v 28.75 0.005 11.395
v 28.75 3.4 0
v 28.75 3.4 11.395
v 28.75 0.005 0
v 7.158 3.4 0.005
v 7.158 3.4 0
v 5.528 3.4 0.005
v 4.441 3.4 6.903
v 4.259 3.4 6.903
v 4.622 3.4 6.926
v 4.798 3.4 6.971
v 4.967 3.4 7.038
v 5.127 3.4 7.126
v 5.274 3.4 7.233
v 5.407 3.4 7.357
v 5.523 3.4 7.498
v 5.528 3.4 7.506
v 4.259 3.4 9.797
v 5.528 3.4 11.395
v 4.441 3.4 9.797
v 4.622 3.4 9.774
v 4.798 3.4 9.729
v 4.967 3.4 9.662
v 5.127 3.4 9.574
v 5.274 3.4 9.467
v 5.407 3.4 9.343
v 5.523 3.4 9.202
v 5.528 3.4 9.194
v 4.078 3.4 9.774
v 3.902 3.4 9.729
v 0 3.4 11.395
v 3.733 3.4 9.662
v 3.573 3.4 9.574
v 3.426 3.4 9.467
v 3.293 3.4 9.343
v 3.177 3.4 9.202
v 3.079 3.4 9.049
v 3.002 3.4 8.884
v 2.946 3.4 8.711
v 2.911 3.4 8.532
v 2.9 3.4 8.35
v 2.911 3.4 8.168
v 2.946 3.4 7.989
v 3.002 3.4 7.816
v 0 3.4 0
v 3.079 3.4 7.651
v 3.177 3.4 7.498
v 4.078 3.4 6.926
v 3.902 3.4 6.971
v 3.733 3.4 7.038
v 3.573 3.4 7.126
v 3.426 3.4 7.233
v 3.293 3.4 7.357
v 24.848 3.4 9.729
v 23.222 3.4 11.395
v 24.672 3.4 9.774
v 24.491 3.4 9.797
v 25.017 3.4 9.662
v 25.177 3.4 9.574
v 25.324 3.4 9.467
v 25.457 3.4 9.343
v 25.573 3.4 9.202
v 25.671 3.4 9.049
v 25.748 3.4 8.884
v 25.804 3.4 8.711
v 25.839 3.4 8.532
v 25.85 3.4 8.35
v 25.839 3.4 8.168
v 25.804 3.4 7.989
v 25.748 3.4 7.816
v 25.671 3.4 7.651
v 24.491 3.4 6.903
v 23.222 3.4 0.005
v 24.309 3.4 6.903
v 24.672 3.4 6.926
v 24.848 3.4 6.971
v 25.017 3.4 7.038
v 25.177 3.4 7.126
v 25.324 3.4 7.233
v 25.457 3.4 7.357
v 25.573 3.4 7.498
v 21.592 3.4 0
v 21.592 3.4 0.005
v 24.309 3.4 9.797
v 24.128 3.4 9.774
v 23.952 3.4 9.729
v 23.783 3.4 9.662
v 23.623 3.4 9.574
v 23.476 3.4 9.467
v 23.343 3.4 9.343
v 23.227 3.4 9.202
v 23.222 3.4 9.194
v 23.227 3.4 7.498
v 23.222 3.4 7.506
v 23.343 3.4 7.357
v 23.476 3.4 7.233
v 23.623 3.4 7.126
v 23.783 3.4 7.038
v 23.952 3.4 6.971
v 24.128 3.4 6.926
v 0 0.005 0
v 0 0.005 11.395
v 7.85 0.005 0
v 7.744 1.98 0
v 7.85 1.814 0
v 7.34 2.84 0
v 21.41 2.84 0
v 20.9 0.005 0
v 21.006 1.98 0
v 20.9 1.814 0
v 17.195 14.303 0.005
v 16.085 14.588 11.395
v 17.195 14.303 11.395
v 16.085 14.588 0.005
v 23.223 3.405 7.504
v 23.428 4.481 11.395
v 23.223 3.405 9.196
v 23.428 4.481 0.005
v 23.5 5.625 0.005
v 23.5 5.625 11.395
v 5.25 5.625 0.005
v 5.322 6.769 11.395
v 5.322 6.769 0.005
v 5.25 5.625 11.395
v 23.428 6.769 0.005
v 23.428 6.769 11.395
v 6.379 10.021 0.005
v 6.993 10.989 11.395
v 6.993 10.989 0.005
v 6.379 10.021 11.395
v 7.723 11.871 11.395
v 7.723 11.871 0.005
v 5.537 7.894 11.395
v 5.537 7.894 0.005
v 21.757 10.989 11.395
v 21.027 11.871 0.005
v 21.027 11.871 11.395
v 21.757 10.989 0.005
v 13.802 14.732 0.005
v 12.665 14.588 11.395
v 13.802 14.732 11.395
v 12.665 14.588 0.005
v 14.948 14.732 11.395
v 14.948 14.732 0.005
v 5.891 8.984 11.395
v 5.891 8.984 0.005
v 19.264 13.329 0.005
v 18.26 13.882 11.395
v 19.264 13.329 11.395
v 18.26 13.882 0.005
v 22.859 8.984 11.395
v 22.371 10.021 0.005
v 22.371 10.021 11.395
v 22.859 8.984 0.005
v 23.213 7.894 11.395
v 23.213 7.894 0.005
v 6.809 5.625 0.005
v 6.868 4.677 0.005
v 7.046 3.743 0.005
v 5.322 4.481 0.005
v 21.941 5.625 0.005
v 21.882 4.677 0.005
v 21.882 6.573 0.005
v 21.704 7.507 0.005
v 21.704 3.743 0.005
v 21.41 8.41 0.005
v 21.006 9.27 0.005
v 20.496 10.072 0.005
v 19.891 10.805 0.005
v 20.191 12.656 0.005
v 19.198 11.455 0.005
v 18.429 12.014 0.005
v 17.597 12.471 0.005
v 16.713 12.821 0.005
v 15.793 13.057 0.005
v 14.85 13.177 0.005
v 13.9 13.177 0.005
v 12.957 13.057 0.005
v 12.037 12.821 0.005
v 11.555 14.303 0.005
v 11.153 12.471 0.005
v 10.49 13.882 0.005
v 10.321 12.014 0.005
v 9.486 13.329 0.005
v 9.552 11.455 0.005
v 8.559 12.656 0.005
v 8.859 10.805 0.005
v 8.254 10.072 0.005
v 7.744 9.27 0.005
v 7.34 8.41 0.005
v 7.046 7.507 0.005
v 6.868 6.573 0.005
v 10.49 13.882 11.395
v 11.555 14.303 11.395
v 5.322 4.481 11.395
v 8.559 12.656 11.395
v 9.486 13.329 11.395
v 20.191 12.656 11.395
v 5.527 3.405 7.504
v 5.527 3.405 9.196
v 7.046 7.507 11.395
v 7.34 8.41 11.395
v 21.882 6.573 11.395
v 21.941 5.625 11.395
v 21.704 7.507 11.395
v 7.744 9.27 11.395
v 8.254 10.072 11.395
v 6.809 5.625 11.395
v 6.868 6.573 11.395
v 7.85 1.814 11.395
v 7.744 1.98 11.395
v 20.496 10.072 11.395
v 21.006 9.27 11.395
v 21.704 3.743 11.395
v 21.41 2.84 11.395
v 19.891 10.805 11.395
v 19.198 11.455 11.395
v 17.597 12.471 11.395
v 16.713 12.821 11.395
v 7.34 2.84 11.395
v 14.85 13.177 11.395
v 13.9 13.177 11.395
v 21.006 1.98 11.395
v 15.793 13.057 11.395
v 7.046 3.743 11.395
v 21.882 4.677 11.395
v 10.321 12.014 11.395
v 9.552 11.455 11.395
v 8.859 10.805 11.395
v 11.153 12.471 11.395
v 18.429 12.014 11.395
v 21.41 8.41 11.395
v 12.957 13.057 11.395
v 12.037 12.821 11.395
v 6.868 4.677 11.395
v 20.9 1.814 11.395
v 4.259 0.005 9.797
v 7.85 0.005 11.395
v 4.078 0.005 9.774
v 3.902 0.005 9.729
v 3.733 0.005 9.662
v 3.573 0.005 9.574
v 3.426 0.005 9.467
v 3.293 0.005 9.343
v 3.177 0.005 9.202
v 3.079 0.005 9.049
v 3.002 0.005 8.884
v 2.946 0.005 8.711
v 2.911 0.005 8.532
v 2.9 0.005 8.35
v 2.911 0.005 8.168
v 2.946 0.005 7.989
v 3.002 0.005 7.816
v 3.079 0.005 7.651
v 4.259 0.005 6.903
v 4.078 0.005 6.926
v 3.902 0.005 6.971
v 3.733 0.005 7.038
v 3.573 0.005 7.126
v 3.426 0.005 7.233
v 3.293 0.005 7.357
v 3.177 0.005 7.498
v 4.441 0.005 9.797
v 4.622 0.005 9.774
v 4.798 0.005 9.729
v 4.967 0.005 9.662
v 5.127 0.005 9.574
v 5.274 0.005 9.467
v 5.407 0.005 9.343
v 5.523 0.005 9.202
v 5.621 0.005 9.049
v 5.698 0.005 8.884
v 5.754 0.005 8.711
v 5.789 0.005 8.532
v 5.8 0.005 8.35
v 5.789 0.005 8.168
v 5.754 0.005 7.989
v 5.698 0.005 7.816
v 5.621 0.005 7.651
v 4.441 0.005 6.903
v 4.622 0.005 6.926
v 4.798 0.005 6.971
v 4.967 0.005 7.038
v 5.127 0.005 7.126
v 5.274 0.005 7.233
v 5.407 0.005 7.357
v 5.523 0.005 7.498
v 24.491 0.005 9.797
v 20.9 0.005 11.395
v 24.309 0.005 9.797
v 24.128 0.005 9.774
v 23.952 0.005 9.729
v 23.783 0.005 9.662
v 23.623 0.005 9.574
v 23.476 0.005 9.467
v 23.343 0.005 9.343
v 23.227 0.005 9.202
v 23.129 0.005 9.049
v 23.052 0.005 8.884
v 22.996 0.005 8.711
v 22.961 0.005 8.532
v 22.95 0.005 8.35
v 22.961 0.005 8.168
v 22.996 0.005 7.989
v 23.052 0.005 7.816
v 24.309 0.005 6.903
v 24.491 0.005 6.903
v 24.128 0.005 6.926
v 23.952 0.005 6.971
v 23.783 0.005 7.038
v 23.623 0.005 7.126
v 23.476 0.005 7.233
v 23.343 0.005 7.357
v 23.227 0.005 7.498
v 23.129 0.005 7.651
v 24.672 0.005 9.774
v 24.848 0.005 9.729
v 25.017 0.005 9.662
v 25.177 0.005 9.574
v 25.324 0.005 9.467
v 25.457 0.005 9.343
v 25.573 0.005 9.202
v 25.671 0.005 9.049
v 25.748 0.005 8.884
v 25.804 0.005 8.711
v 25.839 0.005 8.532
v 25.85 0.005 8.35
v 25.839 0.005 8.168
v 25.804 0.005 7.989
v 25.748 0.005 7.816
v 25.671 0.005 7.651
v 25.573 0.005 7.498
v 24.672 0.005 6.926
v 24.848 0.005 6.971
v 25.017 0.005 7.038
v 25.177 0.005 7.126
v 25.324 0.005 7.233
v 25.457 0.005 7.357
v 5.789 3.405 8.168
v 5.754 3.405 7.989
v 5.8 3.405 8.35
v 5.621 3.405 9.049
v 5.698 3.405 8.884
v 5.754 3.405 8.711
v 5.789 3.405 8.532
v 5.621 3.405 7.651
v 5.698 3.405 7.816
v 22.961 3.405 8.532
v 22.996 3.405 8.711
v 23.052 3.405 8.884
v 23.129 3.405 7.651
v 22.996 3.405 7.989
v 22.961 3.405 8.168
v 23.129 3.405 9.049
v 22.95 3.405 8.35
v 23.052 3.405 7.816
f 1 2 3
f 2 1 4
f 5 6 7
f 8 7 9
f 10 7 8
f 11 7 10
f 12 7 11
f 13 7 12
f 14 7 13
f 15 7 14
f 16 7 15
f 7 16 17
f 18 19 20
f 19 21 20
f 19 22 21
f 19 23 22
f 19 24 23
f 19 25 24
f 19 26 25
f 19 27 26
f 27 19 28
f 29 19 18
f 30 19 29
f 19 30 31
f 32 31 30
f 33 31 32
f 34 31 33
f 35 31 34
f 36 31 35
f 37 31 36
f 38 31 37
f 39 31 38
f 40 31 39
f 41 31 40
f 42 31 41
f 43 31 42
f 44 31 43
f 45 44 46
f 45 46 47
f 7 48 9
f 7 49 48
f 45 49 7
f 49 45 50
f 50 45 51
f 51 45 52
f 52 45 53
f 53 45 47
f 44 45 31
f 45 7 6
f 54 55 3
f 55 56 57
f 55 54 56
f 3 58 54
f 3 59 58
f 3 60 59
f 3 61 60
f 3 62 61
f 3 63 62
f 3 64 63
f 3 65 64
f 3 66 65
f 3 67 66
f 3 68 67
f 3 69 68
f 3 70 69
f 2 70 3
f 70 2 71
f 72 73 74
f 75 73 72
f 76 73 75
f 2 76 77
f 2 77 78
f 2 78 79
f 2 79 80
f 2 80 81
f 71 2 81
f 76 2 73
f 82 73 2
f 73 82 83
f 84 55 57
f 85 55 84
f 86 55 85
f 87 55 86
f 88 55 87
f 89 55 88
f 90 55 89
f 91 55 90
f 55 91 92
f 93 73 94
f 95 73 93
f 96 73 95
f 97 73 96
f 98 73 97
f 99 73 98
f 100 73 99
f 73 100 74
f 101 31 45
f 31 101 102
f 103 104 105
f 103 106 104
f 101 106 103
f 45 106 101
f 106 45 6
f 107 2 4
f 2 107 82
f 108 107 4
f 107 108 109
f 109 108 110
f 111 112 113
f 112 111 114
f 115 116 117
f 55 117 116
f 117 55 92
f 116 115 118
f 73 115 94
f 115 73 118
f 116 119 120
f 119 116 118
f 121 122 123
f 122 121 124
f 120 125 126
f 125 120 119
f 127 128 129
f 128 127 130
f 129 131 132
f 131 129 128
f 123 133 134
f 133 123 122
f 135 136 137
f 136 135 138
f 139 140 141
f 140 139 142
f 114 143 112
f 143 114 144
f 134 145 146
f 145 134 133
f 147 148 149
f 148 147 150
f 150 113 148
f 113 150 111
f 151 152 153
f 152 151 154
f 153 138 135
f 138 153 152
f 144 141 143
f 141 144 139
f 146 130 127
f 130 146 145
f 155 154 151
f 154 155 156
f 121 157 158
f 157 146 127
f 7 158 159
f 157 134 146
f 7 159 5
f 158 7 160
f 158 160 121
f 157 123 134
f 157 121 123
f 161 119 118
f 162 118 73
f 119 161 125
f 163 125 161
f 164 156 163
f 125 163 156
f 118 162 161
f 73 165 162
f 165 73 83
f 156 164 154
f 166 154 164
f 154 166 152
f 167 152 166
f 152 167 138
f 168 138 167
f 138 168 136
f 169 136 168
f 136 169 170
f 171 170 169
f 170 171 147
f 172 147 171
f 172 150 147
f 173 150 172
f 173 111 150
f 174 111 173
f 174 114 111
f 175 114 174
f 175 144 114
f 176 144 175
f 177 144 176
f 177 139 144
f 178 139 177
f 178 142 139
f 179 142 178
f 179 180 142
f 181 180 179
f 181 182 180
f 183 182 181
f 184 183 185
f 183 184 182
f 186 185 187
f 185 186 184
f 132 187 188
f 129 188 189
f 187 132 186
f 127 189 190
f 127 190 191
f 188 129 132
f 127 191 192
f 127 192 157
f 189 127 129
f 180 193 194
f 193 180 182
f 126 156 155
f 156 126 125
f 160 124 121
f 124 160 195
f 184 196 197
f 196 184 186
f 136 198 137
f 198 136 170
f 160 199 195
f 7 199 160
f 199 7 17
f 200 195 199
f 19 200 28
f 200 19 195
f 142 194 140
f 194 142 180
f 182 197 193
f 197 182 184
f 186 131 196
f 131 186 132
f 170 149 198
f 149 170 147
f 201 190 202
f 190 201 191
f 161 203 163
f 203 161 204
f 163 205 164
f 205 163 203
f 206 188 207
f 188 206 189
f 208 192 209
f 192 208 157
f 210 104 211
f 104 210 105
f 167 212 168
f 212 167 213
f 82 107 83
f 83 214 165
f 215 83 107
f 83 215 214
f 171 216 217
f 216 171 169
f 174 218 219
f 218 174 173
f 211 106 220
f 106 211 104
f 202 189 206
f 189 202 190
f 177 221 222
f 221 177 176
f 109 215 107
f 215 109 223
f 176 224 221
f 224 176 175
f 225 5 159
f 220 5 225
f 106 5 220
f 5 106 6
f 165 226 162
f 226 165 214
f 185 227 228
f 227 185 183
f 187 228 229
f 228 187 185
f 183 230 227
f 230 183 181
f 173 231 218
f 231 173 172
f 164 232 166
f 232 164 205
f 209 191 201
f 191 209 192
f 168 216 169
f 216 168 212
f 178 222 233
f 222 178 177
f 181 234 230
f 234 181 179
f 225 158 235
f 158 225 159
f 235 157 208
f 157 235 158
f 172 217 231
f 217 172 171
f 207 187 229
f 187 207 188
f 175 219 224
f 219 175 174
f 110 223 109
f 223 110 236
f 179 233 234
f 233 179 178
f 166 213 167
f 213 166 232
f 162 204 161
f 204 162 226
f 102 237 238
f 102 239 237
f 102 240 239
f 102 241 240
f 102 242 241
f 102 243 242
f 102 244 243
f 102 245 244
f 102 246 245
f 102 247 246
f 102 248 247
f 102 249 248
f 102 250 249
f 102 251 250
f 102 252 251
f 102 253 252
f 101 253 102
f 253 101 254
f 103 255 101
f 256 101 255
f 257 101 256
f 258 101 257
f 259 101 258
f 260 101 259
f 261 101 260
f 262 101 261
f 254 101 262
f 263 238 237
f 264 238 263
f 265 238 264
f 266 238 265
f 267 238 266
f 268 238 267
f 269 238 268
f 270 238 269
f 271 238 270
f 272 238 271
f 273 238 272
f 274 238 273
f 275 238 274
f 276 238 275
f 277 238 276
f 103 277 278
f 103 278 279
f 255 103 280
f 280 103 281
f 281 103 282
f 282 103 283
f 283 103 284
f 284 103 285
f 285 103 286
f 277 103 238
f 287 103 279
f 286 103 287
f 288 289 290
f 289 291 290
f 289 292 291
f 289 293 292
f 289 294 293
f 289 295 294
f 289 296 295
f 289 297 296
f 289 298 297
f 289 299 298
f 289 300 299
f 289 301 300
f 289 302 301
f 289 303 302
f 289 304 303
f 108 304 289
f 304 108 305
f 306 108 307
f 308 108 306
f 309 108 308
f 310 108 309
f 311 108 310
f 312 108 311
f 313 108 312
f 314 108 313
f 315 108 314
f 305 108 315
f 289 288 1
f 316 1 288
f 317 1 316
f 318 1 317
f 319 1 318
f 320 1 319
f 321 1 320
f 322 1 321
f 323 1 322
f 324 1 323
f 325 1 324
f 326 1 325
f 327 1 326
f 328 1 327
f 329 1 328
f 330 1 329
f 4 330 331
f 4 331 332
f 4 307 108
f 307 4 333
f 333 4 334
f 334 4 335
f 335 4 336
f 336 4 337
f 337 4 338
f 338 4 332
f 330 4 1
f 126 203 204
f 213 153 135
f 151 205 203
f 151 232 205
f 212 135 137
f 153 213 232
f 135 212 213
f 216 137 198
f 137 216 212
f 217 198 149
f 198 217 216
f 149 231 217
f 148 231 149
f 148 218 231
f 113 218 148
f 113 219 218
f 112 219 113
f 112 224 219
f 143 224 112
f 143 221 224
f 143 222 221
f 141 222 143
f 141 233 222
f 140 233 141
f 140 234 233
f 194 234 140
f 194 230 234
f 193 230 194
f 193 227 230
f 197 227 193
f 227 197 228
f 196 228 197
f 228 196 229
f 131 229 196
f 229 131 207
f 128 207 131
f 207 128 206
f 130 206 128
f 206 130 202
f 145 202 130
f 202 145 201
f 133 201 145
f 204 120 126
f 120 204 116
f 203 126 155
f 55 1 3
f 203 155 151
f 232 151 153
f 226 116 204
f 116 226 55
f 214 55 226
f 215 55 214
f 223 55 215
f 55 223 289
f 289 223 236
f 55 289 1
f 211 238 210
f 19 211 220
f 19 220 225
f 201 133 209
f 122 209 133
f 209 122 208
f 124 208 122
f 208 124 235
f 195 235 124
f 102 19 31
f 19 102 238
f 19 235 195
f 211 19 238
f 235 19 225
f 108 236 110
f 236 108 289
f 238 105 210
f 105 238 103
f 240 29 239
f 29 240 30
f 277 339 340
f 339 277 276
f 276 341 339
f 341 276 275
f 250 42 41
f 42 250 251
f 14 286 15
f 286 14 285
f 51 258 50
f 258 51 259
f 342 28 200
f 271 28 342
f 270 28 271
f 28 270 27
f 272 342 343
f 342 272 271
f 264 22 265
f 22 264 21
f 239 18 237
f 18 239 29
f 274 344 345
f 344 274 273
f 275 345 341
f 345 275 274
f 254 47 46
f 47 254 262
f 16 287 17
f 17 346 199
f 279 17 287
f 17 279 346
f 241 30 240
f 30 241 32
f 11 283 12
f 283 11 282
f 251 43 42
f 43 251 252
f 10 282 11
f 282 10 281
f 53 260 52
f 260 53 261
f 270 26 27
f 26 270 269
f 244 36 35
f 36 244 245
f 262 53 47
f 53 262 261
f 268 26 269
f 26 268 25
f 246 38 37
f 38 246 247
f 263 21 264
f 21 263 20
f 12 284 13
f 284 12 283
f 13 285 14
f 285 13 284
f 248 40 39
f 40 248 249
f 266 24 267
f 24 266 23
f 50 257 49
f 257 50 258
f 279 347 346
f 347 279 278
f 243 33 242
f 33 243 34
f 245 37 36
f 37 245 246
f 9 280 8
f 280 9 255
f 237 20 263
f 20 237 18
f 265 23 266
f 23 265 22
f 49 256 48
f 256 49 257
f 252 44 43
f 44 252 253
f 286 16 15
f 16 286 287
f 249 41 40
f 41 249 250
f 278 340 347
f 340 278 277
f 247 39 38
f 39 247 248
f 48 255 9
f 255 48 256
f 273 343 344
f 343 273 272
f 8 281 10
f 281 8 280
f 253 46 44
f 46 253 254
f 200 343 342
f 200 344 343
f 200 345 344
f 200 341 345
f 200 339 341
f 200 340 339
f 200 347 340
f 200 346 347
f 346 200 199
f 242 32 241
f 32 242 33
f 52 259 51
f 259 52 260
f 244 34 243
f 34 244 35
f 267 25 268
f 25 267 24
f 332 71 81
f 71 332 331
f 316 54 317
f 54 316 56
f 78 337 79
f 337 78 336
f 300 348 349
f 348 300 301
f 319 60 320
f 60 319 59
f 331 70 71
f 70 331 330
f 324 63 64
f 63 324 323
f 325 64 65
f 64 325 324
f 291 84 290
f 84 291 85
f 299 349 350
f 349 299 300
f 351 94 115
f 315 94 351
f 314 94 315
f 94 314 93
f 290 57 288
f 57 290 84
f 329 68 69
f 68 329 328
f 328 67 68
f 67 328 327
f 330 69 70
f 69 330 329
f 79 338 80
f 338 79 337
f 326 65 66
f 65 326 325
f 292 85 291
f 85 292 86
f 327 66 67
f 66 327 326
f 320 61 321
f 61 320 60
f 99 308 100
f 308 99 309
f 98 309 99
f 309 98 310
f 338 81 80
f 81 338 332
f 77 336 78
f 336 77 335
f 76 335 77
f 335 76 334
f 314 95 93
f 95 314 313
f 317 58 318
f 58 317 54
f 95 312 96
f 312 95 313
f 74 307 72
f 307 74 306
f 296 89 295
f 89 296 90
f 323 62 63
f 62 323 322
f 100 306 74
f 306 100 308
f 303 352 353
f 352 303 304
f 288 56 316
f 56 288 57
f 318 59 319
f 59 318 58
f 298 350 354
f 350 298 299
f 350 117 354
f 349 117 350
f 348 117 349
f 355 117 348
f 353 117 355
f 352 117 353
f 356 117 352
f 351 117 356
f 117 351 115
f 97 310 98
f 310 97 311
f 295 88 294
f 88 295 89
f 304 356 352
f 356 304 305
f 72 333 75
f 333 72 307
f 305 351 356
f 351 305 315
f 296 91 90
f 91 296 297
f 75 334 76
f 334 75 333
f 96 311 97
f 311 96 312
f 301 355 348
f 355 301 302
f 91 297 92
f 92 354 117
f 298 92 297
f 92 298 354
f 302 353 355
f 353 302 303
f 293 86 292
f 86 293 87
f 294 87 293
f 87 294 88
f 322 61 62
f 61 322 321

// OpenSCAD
// model: Prusa i3 MK2 Y Chassis Bearing Straps
//        This replaces the zip ties that tend to stretch and can reduce accuracy over time.
// author: fiveangle@gmail.com
// date: 2016oct11
// ver: 1.0.0
//      1.0.1,Bushmills: improved rendering by eliminating faces resulting from OpenSCAD undecidedness whether
//                       to add or remove them, as many boundaries in difference() evaluated to identical planes. 
//                       I added variable "little" and used it to position and size primitives accordingly.
//                       Also removed a positioning bug, but refrained from attempting a much needed simplification.
// notes: Print 2x "left" and 1x "right". Use 6x M3x10mm button-head or socket-head screws to secure.
// history:
//     -1.0.0 - 2016oct11 - Released
//


$fn = 50;

bearingDiameter = 15.05; // [15.00:Tight - 15.00mm, 15.05:default - 15.05mm, 15.1:Loose - 15.10mm, 15.2:Lucy Goosey - 15.20mm]
bearingLength = 15.1; // [15.0:Tight - 15.00mm, 15.1:default (to ridge) - 15.05mm, 15.2:Loose - 15.20mm, 24.2:Full bearing length - 24.20mm]
bearingType = "left"; // [left:Left, right:right]
nozzleWidth = 0.4; // used to calculate strap thickness
shellsForStrap = 4; // adjust with nozzleWidth to get desired strap thickness
bearingRidgeDiameter = 14.6;
bearingRidgeWidth = 0.8;
mountLength = bearingLength + 2 * bearingRidgeWidth;
screwDiameter = 2.9; // [2.8:Tight - 2.8mm, 2.9:default - 2.9mm, 3.0:Loose 3.0mm]
mountHoleSeparation = 22.9 - (22.9 - 17.2) / 2;
strapThickness = shellsForStrap * nozzleWidth;
mountWidth = mountHoleSeparation + 3 * screwDiameter;
prusaYChassisThickness = 6.2; // Measurement of your Y Chassis thickness
prusaYChassisBearingSlotWidth = bearingDiameter - 2;
prusaYChassisbearingSinkage = 4.3; // Measure Y chassis to bearing distance using depth guage in bearing slot minus about 0.2 mm for pretension
mountTabThickness = (prusaYChassisThickness - prusaYChassisbearingSinkage) + 5;
mountDiameter = bearingDiameter + (2 * strapThickness);
mountHeight = mountDiameter;

little = 0.01;

// polyhole cylinder fitment method: http://hydraraptor.blogspot.com/2011/02/polyholes.html
module polyhole(d, h) {
    n = max(round(2 * d), 3);
    rotate([0, 0, 180])
        cylinder(h = h, r = (d / 2) / cos(180 / n));
}


module bearing() {
        difference() {
            // mount body
            union() {
                cube([mountWidth, mountLength, mountTabThickness]);

                translate([mountWidth / 2, +little/2, (bearingDiameter / 2) + strapThickness])
                    rotate([-90, 0, 0])
                        cylinder(r = (bearingDiameter / 2) + strapThickness, h = mountLength-little);

            }

            // bearing core
            union() {
                    translate([mountWidth / 2, 0, (bearingDiameter / 2) + strapThickness])
                        rotate([-90, 0, 0])
                            cylinder(r = ((bearingRidgeDiameter / 2)), h = mountLength);

                    translate([mountWidth / 2, (mountLength - bearingLength)+little/2, (bearingDiameter / 2) + strapThickness])
                        rotate([-90, 0, 0])
                            polyhole(bearingDiameter, bearingLength+little);

                }
                
            // prusa bearing sink
                translate([-little/2, -little/2, -little/2])
            cube([mountWidth + 10+little, mountLength+little, prusaYChassisThickness - prusaYChassisbearingSinkage + strapThickness+little]);

            if (bearingType == "left")
                translate([-little/2, -little/2, -little/2])
                cube([mountWidth+little, mountLength - (mountLength / 2 + screwDiameter / 2 + strapThickness)+little, bearingDiameter + 2 * strapThickness+little]);

            translate([mountWidth / 2 - prusaYChassisBearingSlotWidth / 2, little/2, 0])
                cube([prusaYChassisBearingSlotWidth, mountLength, (bearingDiameter + 2 * strapThickness) / 2]);



            translate([screwDiameter + screwDiameter / 2, mountLength / 2, -little/2])
                rotate([0, 0, 0])
                    cylinder(r = screwDiameter / 2, h = mountTabThickness+little);

            translate([mountWidth - screwDiameter - screwDiameter / 2, mountLength / 2, -little/2])
                rotate([0, 0, 0])
                    cylinder(r = screwDiameter / 2, h = mountTabThickness+little);
        }

    }


// doit
translate([0, -(prusaYChassisThickness - prusaYChassisbearingSinkage) - strapThickness, mountLength])
    rotate([-90, 0, 0])
        bearing();
